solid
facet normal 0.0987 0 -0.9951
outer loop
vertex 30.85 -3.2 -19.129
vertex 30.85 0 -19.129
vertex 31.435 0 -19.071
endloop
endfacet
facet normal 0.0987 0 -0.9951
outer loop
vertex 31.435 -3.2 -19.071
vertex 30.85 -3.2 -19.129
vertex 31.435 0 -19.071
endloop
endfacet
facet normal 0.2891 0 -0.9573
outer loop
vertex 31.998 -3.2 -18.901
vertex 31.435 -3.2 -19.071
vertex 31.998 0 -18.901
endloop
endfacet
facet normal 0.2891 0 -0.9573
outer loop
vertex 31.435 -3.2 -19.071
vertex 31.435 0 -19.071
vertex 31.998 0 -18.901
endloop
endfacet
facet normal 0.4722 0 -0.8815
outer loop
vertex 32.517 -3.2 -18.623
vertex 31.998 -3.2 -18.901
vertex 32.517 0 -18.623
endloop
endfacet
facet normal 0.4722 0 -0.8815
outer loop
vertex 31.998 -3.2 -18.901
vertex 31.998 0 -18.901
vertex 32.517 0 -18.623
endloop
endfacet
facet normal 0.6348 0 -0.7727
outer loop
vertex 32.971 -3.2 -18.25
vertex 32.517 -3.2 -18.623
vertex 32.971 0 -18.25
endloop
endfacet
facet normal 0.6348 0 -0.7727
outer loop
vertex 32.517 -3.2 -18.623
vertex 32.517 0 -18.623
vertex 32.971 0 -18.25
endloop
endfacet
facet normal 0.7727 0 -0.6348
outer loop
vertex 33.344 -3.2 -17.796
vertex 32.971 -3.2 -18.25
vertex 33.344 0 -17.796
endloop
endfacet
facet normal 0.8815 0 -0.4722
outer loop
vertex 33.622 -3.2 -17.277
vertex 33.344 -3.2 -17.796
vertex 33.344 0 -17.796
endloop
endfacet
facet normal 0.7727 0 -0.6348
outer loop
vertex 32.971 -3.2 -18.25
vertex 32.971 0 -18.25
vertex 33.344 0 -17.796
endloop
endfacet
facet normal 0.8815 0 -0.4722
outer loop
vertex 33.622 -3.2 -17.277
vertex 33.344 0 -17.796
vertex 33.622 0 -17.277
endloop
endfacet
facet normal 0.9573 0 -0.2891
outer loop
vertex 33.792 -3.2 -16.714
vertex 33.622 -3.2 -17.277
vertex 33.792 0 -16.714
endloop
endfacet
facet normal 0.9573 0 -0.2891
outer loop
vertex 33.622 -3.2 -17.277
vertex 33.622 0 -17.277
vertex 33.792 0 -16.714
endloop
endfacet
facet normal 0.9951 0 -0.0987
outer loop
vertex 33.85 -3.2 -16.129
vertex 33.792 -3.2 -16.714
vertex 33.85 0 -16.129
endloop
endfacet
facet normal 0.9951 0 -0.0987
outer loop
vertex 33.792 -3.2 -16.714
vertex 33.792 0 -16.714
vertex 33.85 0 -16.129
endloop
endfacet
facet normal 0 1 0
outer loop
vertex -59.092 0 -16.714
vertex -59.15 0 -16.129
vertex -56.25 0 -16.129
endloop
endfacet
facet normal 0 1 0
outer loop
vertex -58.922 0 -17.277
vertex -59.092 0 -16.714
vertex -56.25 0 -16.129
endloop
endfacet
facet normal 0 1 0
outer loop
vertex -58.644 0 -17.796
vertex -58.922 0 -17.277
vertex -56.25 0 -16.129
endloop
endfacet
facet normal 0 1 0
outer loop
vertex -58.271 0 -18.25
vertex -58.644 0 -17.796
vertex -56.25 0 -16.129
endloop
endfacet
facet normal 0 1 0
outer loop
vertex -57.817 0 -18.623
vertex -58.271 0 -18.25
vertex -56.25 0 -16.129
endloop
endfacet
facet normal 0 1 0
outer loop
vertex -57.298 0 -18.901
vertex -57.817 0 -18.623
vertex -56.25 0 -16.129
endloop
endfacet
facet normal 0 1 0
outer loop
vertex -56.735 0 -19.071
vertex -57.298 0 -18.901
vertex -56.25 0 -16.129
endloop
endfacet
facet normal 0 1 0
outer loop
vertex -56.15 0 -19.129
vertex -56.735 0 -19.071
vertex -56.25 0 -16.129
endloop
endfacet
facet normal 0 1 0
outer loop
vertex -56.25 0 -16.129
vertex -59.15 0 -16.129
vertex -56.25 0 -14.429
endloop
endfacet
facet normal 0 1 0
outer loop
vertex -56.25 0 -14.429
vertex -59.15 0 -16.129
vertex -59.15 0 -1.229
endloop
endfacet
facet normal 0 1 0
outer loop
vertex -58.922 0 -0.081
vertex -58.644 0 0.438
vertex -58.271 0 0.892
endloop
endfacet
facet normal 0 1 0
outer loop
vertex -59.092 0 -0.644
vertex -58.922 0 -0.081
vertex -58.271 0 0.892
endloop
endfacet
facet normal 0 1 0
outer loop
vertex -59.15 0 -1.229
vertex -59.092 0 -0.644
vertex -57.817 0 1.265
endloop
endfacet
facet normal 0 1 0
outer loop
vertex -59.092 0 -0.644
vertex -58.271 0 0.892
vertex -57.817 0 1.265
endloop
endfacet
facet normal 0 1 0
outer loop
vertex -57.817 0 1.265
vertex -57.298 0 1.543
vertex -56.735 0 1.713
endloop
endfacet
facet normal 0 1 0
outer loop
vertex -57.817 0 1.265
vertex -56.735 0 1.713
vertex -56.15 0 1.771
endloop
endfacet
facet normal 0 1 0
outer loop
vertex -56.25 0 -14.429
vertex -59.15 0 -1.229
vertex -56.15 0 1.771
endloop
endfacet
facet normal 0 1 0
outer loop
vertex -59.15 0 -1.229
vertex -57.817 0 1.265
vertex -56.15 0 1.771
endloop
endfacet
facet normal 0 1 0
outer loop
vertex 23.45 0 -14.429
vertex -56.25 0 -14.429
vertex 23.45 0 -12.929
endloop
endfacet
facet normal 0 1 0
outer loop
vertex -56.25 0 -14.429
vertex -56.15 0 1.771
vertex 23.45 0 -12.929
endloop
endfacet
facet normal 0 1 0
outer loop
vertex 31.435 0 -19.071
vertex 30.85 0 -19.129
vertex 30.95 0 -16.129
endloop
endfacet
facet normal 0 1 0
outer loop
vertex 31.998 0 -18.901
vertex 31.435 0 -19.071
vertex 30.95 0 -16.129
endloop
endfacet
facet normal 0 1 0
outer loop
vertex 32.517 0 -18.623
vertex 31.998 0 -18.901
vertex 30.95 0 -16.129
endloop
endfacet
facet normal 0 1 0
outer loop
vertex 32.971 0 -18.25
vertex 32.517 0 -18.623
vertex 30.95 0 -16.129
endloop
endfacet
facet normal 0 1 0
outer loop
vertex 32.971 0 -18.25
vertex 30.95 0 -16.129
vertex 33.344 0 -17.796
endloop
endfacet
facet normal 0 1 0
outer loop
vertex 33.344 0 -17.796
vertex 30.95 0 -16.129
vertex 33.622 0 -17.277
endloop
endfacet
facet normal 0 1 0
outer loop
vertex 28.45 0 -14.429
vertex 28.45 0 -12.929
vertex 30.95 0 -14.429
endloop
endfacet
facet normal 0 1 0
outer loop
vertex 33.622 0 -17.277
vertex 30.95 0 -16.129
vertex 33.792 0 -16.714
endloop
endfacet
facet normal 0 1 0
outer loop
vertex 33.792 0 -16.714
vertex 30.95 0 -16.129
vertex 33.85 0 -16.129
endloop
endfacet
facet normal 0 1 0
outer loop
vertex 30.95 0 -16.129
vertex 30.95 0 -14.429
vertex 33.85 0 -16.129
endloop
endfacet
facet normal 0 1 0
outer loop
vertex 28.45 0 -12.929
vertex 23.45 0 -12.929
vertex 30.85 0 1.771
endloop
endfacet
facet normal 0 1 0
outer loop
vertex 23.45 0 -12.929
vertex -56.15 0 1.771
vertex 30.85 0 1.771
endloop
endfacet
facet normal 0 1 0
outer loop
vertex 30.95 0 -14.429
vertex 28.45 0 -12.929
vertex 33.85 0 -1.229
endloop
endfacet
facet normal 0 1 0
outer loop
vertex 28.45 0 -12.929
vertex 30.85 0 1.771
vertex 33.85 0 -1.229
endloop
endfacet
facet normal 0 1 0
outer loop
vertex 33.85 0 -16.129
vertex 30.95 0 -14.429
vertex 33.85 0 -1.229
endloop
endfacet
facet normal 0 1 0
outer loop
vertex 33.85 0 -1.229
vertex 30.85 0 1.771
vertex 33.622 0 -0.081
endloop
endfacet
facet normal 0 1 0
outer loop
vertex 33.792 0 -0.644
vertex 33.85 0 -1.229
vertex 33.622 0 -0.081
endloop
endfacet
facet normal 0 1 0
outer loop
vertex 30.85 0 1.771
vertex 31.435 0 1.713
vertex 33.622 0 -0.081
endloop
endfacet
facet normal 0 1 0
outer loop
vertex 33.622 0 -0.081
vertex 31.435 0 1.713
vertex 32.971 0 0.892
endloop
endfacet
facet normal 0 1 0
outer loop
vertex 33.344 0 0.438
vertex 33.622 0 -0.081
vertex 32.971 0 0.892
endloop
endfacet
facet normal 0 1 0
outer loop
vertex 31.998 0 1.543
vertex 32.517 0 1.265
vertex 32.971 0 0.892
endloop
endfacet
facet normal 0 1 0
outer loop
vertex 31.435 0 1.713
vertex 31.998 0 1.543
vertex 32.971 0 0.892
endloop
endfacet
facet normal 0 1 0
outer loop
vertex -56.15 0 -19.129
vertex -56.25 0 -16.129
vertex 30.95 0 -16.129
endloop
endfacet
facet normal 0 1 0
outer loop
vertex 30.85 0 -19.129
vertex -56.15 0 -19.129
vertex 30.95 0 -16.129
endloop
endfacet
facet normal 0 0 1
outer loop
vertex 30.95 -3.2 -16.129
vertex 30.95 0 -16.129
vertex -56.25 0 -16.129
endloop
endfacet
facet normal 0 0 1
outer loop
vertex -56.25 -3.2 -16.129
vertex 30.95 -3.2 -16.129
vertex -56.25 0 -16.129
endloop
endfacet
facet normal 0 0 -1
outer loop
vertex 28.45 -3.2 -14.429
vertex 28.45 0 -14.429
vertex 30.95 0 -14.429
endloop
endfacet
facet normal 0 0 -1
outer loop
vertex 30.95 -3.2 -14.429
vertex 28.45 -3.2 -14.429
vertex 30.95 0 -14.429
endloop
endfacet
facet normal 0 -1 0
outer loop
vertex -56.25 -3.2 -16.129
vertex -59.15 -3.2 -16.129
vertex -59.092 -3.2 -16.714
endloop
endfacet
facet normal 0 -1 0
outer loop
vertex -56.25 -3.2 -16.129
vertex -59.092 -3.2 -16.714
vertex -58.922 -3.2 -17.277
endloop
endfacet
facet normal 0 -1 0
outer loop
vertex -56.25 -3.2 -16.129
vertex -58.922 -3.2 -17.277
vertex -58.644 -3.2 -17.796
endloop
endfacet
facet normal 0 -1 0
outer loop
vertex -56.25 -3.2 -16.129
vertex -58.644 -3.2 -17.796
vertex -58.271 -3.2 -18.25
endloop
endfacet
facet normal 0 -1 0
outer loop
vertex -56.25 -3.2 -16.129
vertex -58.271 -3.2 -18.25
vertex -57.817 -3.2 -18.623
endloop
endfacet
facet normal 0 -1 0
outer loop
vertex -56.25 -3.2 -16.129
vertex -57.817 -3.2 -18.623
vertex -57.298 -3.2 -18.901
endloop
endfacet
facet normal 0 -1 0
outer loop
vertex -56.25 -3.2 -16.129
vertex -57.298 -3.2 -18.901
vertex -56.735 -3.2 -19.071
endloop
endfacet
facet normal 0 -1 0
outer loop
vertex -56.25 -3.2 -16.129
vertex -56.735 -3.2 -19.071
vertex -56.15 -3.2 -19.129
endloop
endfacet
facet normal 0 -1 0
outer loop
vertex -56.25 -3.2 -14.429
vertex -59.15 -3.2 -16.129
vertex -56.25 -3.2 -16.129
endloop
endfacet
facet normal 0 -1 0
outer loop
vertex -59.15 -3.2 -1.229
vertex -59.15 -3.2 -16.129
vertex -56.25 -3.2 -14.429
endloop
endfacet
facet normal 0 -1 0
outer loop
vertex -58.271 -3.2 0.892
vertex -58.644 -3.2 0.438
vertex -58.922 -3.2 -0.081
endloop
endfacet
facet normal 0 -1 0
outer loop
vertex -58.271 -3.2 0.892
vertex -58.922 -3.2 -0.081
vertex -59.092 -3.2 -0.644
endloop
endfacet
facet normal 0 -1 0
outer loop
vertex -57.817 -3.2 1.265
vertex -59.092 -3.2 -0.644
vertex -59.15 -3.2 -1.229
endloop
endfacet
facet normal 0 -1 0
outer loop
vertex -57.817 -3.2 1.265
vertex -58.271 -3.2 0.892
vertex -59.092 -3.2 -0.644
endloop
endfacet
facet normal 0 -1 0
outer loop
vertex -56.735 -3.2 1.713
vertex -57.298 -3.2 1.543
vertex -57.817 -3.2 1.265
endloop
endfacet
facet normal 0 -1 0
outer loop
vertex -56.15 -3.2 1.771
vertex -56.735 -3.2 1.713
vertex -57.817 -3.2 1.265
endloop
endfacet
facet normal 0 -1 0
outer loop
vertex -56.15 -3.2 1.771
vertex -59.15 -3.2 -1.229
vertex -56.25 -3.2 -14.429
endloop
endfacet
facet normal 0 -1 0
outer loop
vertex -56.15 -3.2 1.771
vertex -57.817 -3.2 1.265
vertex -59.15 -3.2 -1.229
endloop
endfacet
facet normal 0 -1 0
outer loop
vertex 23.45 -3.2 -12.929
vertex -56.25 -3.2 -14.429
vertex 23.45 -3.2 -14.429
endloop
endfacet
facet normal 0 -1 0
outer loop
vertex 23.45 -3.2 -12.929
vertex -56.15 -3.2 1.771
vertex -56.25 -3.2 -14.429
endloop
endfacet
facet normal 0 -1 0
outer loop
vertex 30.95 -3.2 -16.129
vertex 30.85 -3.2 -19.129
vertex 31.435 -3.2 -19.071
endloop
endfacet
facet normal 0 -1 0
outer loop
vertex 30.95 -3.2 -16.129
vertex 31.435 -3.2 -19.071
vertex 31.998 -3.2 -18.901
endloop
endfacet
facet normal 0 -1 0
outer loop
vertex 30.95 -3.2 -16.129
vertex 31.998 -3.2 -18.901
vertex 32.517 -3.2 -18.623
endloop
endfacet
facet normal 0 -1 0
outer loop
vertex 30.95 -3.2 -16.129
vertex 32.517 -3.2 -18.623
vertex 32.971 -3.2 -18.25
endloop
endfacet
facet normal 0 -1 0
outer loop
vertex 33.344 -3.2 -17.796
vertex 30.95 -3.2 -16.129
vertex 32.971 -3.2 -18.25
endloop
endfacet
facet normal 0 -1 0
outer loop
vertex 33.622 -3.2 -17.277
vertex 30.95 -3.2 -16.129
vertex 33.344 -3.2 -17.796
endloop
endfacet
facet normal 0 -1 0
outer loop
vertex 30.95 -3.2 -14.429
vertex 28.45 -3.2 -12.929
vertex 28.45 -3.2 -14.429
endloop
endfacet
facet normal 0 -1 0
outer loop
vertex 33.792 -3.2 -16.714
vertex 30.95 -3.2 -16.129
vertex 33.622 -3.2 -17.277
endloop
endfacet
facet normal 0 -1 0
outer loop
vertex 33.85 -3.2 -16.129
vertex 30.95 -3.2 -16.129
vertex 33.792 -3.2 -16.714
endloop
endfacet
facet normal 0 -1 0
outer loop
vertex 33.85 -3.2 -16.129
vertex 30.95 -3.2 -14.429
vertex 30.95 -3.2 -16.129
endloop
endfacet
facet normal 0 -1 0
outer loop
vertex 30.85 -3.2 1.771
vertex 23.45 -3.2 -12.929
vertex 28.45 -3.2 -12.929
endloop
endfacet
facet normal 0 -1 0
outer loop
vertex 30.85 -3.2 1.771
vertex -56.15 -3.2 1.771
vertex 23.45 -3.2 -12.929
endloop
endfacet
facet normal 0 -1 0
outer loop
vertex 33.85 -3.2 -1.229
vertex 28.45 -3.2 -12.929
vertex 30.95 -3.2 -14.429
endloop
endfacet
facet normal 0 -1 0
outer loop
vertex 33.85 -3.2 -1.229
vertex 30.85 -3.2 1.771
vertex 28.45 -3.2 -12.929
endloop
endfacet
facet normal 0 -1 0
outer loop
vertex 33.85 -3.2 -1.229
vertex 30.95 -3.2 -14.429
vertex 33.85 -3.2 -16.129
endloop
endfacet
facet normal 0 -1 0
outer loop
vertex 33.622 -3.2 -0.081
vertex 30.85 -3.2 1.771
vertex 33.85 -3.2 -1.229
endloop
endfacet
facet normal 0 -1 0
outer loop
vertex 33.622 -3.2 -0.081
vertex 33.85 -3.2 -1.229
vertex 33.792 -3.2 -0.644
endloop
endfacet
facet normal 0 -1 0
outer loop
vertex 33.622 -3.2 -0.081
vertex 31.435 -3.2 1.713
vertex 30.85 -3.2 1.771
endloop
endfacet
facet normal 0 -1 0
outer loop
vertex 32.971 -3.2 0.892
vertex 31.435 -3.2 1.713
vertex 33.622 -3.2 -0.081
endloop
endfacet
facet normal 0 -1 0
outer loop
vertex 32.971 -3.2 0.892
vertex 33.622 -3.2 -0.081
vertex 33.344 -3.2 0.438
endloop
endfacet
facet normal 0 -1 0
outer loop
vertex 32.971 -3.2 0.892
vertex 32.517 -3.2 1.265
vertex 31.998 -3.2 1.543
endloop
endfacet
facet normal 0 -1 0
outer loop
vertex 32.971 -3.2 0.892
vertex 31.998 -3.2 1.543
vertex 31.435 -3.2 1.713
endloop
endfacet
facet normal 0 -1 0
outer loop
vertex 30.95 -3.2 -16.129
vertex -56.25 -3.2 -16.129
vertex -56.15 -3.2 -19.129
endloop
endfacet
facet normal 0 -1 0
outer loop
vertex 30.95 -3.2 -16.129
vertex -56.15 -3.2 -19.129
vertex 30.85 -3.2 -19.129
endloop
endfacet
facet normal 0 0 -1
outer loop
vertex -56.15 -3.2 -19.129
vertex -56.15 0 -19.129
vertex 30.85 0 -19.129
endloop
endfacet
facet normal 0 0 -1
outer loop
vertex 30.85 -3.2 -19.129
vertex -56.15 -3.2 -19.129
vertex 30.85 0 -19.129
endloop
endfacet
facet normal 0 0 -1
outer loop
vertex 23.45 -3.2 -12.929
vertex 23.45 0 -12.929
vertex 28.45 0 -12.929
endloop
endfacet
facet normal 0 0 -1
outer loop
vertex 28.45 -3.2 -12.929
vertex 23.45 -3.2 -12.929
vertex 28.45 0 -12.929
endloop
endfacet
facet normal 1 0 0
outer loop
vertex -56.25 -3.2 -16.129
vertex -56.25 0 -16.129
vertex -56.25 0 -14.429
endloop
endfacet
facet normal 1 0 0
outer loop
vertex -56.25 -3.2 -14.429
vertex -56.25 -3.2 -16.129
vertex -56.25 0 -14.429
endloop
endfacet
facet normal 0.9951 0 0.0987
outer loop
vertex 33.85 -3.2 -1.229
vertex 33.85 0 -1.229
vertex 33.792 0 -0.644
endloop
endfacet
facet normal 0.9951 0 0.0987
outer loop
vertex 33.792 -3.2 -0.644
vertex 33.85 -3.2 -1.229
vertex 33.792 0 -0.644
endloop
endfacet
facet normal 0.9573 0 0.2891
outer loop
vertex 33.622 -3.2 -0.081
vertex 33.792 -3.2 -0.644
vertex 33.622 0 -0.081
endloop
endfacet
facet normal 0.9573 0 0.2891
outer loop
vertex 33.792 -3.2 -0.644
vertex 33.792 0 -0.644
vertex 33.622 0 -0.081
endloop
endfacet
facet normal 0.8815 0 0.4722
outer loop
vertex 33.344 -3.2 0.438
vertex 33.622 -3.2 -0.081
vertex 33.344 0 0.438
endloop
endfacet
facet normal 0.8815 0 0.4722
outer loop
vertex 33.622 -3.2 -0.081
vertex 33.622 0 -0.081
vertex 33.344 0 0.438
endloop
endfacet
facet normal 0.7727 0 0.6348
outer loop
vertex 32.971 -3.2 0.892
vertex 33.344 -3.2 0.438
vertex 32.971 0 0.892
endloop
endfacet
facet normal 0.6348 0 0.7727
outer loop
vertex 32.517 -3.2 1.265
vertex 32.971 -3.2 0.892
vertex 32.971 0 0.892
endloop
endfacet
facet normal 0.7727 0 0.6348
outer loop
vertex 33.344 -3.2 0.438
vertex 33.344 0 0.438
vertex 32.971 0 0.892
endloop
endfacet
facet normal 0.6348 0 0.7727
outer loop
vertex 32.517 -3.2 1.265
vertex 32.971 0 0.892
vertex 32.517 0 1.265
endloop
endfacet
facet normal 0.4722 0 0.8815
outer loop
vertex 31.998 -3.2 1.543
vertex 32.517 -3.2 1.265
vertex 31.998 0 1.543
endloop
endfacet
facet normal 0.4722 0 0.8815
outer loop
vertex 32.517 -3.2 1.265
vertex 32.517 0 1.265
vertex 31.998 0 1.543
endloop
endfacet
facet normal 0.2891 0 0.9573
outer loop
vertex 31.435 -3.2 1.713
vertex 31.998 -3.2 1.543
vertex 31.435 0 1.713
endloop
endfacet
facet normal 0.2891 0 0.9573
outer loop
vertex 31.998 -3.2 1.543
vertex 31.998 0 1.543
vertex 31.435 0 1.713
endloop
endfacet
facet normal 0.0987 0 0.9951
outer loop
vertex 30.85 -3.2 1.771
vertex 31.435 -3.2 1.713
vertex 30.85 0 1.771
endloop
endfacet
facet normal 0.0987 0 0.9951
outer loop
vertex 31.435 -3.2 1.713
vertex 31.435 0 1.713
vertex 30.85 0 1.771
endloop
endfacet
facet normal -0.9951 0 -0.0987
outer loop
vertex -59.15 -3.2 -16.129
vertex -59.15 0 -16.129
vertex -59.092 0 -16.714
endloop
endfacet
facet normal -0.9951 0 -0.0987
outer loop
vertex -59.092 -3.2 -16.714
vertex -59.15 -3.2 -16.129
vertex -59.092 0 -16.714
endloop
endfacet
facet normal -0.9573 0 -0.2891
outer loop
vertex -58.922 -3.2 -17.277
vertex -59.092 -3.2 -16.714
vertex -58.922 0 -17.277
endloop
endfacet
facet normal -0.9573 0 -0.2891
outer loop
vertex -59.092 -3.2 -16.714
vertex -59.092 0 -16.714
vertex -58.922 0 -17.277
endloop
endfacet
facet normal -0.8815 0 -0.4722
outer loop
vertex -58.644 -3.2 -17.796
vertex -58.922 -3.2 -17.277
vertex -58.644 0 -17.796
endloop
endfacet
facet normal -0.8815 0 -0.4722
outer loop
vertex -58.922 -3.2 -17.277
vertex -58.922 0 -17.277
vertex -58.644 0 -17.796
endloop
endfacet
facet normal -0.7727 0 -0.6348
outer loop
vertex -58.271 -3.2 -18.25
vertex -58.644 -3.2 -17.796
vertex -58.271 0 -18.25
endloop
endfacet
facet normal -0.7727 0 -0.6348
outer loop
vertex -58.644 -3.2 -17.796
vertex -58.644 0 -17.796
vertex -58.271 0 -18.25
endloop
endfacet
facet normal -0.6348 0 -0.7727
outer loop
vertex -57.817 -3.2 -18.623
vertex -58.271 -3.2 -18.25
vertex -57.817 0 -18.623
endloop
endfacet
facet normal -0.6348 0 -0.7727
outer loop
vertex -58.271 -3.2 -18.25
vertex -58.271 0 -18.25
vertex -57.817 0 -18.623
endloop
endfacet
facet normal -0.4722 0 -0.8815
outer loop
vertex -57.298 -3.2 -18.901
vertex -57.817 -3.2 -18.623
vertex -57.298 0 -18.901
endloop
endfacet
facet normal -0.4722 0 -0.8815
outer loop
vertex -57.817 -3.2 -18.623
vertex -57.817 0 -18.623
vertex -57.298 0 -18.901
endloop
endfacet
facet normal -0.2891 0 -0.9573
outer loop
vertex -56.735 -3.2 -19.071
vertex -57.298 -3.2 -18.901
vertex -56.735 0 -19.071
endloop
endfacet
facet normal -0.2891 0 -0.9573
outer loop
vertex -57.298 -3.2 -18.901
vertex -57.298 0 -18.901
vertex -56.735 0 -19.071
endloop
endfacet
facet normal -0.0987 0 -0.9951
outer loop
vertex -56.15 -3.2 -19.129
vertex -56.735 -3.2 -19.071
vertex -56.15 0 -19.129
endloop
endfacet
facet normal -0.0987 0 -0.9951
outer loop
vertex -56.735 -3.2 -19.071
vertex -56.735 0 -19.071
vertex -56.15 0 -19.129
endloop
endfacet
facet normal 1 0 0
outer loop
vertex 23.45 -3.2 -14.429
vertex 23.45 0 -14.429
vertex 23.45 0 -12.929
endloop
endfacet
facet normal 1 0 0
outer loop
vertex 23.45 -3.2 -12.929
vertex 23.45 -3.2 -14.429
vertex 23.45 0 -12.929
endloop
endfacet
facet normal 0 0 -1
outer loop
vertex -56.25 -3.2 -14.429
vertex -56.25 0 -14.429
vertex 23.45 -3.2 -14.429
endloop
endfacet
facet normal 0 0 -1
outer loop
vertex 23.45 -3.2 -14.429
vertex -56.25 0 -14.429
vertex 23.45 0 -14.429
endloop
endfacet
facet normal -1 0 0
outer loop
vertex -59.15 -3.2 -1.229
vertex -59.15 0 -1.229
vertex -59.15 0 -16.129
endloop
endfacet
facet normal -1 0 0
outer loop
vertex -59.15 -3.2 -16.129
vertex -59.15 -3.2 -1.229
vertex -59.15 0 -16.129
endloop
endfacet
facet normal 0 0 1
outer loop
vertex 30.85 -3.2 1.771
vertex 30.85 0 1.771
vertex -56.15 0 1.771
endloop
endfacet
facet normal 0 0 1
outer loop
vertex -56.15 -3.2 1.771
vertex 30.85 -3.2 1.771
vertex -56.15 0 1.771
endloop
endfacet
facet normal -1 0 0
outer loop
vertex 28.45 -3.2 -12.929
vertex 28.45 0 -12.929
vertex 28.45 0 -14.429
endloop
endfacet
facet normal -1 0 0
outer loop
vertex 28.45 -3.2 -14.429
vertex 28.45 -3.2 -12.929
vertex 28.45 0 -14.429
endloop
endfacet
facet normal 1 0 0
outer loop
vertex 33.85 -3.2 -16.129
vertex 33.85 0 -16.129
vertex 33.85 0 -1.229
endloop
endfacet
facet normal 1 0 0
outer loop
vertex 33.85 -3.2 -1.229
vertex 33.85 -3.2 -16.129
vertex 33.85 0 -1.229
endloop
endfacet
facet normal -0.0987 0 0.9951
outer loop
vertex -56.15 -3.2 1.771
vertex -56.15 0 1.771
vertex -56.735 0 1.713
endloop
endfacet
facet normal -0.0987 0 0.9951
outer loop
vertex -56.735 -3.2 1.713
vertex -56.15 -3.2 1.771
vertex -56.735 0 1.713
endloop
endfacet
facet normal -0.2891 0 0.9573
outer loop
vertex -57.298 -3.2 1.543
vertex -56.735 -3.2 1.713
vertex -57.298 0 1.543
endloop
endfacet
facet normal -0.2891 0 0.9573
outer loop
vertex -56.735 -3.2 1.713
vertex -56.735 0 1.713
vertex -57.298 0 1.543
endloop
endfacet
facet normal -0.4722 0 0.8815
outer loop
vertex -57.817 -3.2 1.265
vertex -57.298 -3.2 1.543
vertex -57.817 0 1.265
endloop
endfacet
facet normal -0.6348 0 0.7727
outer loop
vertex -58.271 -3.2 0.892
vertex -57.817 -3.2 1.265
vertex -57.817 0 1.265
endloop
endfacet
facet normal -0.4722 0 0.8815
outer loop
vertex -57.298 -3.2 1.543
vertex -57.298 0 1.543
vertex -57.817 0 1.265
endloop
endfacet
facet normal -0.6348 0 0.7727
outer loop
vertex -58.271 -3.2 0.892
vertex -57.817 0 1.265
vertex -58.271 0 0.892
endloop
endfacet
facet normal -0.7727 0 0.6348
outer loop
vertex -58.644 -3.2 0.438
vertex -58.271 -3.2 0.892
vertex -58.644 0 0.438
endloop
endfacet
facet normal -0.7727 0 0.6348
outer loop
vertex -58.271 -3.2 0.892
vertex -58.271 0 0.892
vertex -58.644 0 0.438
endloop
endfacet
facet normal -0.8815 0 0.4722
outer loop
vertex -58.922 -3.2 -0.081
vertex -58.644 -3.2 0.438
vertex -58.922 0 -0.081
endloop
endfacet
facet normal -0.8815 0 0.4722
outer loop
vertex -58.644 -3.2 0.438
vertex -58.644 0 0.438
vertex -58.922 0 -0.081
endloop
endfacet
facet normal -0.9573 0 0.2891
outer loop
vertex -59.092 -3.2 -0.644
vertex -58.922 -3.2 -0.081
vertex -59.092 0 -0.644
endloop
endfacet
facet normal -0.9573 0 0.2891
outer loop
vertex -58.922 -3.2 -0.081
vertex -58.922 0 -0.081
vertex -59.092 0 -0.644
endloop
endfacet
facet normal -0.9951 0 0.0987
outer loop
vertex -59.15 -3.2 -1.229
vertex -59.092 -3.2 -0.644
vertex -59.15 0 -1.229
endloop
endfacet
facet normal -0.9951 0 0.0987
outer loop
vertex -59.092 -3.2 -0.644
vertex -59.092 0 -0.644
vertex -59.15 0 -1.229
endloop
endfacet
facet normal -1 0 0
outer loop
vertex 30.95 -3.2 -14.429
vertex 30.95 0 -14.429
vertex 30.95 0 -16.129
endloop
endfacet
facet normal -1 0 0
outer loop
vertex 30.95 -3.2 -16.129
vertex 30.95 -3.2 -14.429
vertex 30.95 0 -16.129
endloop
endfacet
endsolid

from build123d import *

# Parameters (mm, degrees)
F1_DEPTH = 3.2


with BuildPart() as f1:
    # F0 (on Front) → F1 (new body)
    with BuildSketch(Plane.XZ):
        with BuildLine():
            Line((30.850063, 1.770954), (-56.149937, 1.770954))
            ThreePointArc((-56.149937, 1.770954), (-58.271257, 0.892275), (-59.149937, -1.229046))
            Line((-59.149937, -1.229046), (-59.149937, -16.129046))
            ThreePointArc((-59.149937, -16.129046), (-58.271257, -18.250366), (-56.149937, -19.129046))
            Line((-56.149937, -19.129046), (30.850063, -19.129046))
            ThreePointArc((30.850063, -19.129046), (32.971384, -18.250366), (33.850063, -16.129046))
            Line((33.850063, -16.129046), (33.850063, -1.229046))
            ThreePointArc((33.850063, -1.229046), (32.971384, 0.892275), (30.850063, 1.770954))
        make_face()
        Polygon((-56.249937, -16.129046), (-56.249937, -14.429046), (23.450063, -14.429046), (23.450063, -12.929046), (28.450063, -12.929046), (28.450063, -14.429046), (30.950063, -14.429046), (30.950063, -16.129046), align=None, mode=Mode.SUBTRACT)
    extrude(amount=F1_DEPTH)


solid = f1.part
